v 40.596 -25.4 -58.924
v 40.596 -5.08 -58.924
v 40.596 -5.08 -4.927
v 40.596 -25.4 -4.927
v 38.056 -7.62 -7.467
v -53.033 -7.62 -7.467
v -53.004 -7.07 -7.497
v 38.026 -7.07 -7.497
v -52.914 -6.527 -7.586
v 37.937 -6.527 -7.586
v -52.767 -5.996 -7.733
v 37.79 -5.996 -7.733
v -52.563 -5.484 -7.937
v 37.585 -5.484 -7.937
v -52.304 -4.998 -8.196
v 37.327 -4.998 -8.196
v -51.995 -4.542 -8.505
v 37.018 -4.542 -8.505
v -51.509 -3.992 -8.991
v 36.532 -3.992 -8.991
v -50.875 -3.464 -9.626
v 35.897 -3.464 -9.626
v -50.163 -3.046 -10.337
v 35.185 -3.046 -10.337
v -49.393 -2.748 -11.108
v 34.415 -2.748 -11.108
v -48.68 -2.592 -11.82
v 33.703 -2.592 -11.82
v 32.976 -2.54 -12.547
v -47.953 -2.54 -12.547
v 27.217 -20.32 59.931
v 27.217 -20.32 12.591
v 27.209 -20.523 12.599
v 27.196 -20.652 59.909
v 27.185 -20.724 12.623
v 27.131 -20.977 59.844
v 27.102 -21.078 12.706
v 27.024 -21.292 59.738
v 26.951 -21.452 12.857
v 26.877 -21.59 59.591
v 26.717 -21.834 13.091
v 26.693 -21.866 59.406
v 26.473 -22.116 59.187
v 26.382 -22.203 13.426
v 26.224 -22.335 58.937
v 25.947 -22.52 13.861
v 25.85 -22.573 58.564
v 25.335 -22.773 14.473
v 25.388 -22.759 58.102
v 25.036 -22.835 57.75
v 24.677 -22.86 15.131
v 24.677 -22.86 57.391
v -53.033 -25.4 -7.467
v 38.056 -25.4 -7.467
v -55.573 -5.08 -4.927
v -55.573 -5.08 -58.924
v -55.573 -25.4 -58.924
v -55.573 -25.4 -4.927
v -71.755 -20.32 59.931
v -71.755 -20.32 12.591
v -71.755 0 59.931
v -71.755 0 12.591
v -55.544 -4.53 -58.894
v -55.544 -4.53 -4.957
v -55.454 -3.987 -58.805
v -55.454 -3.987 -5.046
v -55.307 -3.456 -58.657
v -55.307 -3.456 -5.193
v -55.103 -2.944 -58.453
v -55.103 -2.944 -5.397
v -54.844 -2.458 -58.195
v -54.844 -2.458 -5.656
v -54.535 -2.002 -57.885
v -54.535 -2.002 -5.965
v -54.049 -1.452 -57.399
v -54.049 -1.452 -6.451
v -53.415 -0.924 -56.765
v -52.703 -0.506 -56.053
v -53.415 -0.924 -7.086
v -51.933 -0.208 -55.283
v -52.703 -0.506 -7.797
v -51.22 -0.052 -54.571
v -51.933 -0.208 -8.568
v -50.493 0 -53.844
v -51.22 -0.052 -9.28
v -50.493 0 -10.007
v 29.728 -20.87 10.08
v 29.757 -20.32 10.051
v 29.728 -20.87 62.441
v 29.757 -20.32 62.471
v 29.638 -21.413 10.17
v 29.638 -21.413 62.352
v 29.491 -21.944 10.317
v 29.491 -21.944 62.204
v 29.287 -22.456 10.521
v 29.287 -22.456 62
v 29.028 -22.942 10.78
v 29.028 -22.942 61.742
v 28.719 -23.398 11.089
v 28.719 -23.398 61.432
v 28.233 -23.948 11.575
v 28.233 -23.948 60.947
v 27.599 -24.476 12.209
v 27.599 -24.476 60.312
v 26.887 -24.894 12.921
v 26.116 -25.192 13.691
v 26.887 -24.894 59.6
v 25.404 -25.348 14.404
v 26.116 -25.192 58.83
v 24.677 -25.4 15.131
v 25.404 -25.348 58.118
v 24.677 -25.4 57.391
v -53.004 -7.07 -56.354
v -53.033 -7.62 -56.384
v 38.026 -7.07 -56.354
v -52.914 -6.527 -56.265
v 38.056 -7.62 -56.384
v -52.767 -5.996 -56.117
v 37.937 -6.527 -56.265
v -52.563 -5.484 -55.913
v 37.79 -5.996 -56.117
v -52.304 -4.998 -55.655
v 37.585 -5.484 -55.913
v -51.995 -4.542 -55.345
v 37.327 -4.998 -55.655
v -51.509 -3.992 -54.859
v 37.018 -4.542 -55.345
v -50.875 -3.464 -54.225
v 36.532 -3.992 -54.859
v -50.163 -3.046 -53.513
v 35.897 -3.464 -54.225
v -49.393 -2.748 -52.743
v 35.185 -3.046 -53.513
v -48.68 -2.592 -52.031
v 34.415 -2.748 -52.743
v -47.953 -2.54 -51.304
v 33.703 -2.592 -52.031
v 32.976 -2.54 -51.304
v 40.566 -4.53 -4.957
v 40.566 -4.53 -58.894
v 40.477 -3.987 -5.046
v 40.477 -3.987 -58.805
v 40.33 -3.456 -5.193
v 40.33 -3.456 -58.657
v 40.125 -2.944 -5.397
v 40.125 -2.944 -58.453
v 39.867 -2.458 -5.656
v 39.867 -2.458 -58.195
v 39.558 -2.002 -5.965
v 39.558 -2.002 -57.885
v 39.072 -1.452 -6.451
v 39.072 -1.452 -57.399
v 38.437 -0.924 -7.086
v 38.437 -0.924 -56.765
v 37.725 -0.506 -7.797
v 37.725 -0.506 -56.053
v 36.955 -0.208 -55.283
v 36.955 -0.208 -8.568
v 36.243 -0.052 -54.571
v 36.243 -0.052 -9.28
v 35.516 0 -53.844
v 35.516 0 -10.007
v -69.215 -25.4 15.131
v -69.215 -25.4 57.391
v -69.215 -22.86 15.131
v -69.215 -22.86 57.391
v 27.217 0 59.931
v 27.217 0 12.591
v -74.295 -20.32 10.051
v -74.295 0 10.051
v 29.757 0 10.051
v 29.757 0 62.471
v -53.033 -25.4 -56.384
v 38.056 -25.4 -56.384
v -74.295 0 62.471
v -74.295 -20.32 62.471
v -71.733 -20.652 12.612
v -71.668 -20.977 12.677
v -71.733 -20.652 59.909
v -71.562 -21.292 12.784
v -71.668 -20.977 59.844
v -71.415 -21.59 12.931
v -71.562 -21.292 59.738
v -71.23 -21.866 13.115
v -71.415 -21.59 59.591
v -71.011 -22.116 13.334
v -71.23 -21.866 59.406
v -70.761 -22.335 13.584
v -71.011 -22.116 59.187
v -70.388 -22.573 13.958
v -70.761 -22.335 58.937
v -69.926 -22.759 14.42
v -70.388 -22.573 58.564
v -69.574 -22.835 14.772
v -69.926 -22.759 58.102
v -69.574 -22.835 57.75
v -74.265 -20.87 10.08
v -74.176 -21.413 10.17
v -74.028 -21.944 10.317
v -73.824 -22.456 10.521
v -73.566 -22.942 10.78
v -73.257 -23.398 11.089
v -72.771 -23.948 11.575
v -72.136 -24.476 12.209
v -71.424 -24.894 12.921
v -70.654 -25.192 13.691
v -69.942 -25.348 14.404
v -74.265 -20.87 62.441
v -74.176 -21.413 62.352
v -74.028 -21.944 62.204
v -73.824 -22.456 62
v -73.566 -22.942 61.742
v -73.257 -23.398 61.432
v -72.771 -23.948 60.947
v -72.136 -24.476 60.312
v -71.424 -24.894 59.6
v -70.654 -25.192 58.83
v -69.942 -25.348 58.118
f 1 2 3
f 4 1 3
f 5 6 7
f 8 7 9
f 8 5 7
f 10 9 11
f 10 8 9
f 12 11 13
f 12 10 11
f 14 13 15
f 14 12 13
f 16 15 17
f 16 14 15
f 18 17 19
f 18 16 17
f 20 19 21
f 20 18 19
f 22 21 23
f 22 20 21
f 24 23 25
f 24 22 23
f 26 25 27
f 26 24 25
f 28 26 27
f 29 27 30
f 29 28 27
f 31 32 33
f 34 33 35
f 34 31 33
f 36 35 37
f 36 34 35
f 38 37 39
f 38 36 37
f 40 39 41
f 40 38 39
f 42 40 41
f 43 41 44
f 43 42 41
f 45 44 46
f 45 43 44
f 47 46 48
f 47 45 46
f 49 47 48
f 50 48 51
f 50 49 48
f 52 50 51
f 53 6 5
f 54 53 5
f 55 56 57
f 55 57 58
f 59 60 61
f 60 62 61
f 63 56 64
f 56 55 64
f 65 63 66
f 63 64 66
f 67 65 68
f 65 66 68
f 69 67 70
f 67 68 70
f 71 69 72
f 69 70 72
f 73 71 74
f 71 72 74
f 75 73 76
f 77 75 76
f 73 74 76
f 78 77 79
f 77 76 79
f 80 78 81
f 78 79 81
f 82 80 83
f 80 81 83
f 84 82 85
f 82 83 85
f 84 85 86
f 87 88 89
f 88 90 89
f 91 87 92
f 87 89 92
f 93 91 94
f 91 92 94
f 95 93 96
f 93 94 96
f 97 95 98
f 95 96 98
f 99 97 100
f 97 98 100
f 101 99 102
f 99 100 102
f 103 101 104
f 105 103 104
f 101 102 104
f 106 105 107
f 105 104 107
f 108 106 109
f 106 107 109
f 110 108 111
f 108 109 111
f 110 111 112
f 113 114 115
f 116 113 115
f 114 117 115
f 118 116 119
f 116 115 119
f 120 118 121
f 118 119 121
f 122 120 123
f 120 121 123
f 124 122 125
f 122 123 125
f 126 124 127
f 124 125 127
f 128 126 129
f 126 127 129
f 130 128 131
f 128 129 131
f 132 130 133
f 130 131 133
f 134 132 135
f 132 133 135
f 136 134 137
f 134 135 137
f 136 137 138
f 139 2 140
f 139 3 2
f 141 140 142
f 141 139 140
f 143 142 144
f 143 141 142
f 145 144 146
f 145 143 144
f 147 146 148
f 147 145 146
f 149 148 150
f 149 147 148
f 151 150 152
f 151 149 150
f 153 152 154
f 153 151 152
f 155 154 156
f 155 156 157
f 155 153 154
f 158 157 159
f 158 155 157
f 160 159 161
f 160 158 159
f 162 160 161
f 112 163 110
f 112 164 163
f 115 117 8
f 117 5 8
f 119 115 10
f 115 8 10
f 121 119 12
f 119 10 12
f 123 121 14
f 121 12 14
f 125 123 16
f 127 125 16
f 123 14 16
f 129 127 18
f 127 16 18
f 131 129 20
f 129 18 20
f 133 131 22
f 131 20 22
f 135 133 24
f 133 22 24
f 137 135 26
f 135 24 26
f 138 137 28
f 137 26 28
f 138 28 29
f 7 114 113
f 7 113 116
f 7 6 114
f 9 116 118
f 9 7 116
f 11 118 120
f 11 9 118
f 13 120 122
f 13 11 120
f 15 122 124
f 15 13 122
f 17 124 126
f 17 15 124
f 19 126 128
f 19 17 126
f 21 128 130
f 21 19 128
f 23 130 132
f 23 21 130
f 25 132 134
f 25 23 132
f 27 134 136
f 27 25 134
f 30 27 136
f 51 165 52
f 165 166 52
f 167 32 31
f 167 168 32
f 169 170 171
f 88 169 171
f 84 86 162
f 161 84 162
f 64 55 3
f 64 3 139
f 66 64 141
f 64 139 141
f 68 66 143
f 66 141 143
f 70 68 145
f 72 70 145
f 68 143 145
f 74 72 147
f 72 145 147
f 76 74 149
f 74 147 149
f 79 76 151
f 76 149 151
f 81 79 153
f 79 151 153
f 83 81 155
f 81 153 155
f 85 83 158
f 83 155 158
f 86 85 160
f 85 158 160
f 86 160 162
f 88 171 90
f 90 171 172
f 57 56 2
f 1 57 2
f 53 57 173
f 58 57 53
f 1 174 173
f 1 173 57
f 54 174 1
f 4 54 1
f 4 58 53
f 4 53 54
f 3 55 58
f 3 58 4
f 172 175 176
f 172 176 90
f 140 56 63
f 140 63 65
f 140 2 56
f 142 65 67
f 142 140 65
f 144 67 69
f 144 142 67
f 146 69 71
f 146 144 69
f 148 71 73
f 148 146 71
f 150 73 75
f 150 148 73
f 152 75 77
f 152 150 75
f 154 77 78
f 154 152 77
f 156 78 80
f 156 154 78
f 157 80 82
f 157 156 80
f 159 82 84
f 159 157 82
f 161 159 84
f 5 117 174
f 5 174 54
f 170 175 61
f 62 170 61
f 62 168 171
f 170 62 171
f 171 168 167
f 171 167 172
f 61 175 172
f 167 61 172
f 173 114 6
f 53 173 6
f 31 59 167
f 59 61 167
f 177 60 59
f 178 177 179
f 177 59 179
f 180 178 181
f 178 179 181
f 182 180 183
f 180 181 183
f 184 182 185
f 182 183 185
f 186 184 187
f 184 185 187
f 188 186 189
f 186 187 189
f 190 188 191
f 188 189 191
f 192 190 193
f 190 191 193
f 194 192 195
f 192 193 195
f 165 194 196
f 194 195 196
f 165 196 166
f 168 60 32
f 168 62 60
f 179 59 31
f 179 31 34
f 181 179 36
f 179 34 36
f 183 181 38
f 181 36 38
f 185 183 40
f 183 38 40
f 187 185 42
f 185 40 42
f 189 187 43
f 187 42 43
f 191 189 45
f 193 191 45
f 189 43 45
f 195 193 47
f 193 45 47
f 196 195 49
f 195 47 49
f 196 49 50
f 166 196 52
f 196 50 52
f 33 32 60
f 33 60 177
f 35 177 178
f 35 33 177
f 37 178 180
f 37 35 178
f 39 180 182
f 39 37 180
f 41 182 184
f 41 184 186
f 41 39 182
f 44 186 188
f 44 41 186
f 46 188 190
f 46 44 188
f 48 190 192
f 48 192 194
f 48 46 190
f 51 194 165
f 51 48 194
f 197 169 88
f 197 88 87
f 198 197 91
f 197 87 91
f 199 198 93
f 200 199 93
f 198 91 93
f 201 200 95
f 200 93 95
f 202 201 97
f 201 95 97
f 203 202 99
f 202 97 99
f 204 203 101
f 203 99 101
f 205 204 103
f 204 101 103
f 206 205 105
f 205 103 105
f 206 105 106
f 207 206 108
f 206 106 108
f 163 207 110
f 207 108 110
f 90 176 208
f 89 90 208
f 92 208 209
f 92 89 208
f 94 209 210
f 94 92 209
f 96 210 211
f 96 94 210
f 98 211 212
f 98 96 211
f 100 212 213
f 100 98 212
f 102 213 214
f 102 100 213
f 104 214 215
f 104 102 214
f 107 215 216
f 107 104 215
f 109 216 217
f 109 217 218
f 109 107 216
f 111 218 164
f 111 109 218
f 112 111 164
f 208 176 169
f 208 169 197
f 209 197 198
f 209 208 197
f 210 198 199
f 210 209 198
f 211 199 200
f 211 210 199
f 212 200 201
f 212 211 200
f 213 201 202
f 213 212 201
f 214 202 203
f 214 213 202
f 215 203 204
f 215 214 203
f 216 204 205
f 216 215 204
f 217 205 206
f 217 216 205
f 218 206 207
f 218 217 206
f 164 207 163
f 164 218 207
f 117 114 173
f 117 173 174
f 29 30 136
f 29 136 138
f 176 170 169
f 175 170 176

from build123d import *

# Parameters (mm, degrees)
F0_W     = 104.052413255
F0_H     = 52.4203460664
F1_DEPTH = 25.4
F2_R     = 5.08
F3_T     = -2.54
F4_W     = 96.1696626619
F4_H     = 53.9968945086
F5_DEPTH = 25.4
F6_T     = -2.54
F7_R     = 5.08
F8_R     = 5.08


with BuildPart() as f1:
    # F0 (on Front) → F1 (new body)
    with BuildSketch(Plane.XZ):
        with Locations((-22.2687926143, 36.2606905401)):
            Rectangle(F0_W, F0_H)
    extrude(amount=F1_DEPTH)

    # F2
    f2_edges = [f1.edges().sort_by_distance(p)[0] for p in [
        (-22.268793, -25.4, 10.050518),
        (29.757414, -25.4, 36.260691),
        (-22.268793, -25.4, 62.470864),
        (-74.294999, -25.4, 36.260691),
    ]]
    fillet(f2_edges, radius=F2_R)

    # F3
    f3_openings = [f1.faces().sort_by_distance(p)[0] for p in [
        (-22.268793, 0, 36.260691),
    ]]
    offset(amount=F3_T, openings=f3_openings)


with BuildPart() as f5:
    # F4 (on Front) → F5 (new body)
    with BuildSketch(Plane.XZ):
        with Locations((-7.4886209331, -31.9251716137)):
            Rectangle(F4_W, F4_H)
    extrude(amount=F5_DEPTH)

    # F6
    f6_openings = [f5.faces().sort_by_distance(p)[0] for p in [
        (-7.488621, -25.4, -31.925172),
    ]]
    offset(amount=F6_T, openings=f6_openings)

    # F7
    f7_edges = [f5.edges().sort_by_distance(p)[0] for p in [
        (-53.033452, -2.54, -31.925172),
        (-7.488621, -2.54, -56.383619),
        (38.05621, -2.54, -31.925172),
        (-7.488621, -2.54, -7.466724),
    ]]
    fillet(f7_edges, radius=F7_R)

    # F8
    f8_edges = [f5.edges().sort_by_distance(p)[0] for p in [
        (-7.488621, 0, -4.926724),
        (-55.573452, 0, -31.925172),
        (-7.488621, 0, -58.923619),
        (40.59621, 0, -31.925172),
    ]]
    fillet(f8_edges, radius=F8_R)


solid = Compound([f1.part, f5.part])
